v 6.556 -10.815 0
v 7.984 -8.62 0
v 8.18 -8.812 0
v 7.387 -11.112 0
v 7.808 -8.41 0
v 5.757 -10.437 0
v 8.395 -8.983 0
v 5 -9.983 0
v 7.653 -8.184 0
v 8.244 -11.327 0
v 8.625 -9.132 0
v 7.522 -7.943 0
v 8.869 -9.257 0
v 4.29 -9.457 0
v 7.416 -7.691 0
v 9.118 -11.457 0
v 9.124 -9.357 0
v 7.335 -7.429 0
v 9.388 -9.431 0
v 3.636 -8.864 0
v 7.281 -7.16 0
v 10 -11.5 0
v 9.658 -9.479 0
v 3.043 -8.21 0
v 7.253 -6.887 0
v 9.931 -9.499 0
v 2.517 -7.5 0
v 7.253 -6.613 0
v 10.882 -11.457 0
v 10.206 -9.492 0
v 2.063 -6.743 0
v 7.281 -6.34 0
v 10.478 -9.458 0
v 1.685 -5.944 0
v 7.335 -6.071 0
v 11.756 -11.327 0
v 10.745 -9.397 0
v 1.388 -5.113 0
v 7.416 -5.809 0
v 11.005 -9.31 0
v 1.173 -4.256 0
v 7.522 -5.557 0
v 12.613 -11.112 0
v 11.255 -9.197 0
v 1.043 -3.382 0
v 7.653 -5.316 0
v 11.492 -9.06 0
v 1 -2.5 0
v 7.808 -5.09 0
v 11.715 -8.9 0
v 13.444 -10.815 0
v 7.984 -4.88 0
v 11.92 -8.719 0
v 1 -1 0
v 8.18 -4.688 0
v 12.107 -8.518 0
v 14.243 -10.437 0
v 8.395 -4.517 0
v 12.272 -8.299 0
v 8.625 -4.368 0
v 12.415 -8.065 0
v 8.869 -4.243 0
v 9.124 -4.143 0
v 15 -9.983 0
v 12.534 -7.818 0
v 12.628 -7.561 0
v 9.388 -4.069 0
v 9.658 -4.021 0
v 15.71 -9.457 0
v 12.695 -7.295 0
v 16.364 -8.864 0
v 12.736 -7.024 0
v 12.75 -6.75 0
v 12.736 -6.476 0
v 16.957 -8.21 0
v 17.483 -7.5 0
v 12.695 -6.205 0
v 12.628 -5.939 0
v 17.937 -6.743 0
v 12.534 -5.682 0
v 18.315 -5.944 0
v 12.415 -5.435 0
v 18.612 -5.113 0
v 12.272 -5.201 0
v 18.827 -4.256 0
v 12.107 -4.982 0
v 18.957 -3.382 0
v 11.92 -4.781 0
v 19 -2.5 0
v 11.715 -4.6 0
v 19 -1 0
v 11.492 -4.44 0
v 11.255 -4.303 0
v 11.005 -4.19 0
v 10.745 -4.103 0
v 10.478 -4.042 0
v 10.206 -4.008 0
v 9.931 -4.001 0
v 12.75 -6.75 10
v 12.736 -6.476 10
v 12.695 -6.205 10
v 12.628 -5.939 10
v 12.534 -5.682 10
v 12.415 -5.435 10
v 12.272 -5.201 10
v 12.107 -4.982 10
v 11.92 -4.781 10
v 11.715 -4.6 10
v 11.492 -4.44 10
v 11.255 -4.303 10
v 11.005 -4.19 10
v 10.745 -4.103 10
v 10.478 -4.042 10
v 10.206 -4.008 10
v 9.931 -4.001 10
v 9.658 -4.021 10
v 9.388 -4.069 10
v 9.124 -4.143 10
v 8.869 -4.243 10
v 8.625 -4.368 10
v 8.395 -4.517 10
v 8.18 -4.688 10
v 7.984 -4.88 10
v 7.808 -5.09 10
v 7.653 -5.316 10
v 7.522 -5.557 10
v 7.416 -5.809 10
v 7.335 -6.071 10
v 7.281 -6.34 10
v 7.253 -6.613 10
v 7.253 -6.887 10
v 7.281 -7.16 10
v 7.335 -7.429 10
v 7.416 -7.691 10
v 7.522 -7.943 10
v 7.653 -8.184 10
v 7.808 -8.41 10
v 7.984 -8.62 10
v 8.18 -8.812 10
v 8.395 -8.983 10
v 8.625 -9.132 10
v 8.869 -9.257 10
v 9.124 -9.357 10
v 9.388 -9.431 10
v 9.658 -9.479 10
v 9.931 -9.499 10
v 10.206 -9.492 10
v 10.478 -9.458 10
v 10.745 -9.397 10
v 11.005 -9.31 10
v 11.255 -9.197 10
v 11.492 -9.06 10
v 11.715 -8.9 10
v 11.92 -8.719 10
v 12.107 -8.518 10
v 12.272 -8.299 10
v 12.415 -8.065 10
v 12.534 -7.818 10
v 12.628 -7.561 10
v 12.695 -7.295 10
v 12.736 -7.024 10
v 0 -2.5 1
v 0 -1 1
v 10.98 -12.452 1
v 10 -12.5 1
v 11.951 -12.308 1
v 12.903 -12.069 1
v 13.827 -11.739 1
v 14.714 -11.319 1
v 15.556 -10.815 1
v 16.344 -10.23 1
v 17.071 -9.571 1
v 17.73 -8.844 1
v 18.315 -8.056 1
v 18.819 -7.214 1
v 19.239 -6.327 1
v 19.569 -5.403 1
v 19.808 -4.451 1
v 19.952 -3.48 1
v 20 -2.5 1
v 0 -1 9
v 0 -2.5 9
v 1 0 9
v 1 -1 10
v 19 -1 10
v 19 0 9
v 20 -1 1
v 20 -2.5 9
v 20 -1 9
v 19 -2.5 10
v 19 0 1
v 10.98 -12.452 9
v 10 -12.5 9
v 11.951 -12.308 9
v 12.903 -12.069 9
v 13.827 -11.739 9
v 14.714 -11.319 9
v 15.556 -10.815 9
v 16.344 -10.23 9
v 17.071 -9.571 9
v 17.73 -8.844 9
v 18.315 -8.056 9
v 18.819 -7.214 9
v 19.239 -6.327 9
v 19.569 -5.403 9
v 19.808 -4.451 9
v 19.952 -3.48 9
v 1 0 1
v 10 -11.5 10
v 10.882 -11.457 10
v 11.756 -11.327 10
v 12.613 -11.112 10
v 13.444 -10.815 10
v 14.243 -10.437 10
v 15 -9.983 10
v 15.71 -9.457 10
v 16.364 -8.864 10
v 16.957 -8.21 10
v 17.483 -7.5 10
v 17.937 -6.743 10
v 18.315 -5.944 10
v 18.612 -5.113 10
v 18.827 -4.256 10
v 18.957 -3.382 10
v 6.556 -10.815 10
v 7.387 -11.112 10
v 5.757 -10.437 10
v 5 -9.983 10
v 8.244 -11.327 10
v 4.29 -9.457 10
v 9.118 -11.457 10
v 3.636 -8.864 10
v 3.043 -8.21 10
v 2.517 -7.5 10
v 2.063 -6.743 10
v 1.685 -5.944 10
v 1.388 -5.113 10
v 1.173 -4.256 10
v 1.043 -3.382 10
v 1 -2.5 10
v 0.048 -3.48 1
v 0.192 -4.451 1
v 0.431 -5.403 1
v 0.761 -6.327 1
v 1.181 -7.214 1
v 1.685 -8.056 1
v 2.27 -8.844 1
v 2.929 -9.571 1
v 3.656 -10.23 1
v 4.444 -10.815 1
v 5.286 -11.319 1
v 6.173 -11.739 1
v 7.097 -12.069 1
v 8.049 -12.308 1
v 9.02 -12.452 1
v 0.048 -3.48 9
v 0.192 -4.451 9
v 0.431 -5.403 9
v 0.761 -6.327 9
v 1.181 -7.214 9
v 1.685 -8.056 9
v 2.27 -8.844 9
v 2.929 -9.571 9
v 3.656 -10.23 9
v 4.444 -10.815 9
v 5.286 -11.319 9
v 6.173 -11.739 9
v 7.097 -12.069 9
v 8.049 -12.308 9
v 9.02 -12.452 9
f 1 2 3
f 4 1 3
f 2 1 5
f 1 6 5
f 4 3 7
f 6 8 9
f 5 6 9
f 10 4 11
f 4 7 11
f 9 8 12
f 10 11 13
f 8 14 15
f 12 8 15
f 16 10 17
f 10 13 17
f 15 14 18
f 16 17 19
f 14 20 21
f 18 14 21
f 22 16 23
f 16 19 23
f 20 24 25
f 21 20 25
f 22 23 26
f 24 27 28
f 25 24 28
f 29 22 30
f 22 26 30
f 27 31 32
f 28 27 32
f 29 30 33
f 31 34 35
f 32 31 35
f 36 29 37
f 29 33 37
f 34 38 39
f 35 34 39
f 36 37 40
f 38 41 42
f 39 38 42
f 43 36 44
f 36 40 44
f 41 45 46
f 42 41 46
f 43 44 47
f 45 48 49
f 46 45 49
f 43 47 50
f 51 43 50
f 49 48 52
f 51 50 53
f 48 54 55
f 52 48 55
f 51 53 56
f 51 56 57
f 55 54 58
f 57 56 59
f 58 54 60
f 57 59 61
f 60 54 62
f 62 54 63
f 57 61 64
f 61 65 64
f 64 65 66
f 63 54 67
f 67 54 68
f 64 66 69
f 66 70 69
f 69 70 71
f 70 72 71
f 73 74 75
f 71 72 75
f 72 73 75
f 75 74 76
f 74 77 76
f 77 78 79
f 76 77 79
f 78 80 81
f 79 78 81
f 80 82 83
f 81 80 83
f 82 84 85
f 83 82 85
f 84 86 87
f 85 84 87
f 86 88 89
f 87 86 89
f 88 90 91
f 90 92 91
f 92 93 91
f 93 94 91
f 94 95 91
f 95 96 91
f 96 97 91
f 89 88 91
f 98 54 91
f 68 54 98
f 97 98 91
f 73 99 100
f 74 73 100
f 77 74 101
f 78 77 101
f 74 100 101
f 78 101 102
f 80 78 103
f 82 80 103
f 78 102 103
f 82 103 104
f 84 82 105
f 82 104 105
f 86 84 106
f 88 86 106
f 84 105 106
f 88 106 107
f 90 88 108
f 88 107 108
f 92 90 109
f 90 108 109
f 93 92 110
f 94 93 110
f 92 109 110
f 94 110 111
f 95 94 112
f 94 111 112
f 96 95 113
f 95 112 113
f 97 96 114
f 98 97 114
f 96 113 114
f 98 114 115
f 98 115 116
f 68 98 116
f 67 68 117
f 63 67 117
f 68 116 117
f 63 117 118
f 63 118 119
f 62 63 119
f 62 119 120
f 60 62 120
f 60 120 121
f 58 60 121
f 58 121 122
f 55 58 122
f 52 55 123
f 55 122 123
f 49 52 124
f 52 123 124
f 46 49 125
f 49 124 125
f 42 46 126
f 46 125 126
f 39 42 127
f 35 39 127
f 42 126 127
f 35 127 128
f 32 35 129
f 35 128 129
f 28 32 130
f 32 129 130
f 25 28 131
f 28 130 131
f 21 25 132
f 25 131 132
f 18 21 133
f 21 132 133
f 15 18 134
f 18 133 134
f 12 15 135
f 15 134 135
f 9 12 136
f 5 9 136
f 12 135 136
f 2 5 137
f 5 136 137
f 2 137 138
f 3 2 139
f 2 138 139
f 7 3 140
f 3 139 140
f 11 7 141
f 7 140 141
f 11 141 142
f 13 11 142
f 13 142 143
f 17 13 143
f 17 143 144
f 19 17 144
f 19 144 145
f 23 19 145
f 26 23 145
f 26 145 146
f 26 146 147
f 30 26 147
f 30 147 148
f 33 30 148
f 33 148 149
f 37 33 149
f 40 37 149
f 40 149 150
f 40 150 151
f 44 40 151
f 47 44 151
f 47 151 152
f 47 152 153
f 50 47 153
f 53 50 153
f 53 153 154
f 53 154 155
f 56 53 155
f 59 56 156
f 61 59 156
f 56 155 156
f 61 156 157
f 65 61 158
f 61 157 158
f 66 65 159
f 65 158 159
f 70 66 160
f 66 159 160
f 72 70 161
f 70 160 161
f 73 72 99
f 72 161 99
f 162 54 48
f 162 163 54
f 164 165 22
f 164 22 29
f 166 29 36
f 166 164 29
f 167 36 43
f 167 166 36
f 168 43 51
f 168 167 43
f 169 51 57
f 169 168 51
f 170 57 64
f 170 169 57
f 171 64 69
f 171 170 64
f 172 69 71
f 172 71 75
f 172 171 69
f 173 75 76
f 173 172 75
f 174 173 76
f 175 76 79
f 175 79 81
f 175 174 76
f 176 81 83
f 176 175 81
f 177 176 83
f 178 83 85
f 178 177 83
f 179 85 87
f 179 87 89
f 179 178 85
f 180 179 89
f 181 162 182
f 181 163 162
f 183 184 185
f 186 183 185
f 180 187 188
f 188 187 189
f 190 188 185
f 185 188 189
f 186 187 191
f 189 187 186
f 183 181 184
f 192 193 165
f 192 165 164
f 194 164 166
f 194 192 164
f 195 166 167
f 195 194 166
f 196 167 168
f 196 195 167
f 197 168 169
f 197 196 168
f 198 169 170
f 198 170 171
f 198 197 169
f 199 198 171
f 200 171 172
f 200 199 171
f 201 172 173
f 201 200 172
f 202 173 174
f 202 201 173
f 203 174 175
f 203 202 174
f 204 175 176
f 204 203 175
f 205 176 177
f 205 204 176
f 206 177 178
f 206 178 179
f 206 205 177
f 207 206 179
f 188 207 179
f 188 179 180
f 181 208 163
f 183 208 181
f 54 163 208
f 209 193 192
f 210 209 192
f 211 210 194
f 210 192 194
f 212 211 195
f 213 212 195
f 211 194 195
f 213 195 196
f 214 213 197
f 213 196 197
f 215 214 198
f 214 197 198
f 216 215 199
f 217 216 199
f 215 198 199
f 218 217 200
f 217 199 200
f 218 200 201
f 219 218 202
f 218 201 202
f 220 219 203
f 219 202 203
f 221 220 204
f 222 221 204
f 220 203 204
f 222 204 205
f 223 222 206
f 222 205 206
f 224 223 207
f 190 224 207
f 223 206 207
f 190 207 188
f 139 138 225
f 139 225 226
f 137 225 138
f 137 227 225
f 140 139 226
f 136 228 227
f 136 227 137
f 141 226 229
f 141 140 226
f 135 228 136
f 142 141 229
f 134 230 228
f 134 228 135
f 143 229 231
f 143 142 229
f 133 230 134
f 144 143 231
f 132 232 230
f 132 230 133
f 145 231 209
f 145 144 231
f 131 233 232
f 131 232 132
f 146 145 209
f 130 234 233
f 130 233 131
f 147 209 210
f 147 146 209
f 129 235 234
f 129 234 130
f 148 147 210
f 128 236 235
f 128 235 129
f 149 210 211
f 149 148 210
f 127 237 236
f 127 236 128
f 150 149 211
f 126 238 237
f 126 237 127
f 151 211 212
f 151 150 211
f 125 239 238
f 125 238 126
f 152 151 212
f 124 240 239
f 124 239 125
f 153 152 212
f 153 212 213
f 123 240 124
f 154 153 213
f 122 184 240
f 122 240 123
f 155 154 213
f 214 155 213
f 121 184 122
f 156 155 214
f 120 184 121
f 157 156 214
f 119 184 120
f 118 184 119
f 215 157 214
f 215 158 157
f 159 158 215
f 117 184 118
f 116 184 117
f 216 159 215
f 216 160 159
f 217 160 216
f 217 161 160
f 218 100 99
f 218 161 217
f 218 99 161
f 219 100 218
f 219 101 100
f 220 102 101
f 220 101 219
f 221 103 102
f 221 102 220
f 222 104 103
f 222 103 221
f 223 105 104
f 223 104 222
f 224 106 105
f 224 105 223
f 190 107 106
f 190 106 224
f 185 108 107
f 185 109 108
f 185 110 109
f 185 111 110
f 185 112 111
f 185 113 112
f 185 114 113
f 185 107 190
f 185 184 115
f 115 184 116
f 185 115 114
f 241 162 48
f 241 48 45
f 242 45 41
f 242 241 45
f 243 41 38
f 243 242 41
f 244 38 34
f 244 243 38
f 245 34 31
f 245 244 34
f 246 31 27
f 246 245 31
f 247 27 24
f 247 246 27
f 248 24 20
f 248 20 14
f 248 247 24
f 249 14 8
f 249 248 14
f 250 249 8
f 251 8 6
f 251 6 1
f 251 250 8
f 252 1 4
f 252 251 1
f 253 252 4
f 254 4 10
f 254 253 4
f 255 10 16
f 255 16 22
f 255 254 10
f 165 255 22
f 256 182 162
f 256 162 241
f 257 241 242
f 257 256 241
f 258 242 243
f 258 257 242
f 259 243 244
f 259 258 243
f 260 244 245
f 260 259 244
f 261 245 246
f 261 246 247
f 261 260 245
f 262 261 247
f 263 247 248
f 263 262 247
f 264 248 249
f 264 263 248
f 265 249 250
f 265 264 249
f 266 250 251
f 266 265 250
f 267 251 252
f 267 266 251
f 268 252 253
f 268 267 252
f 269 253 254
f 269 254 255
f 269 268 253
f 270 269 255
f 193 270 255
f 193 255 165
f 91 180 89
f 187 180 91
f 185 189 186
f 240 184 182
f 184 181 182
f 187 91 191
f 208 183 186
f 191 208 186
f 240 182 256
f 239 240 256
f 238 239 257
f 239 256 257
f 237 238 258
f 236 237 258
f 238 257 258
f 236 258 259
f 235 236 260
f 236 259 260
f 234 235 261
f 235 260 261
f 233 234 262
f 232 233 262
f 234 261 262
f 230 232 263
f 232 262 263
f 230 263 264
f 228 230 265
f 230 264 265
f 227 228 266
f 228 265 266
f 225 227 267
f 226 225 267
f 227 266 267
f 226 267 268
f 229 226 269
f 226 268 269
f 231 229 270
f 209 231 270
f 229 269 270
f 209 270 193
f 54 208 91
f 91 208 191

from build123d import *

# Parameters (mm, degrees)
F0_W     = 20
F0_H     = 10
F1_DEPTH = 12.5
F2_R     = 2.75
F3_DEPTH = 10
F4_R     = 9.99999
F5_SIZE  = 1


# Not quite as in the source:
# - a fillet or chamfer is up to 0.001 mm smaller than in the source, because OpenCascade refuses the exact size


with BuildPart() as f1:
    # F0 (on Front) → F1 (new body)
    with BuildSketch(Plane.XZ):
        with Locations((10, 5)):
            Rectangle(F0_W, F0_H)
    extrude(amount=F1_DEPTH)

    # F2 (on face) → F3 (cut, through all)
    with BuildSketch(Plane.XY.offset(10)):
        with Locations((10, -6.75)):
            Circle(F2_R)
    extrude(amount=-F3_DEPTH, mode=Mode.SUBTRACT)

    # F4 (radius 10 in the source; OpenCascade refuses exactly that, so slightly less here)
    f4_edges = [f1.edges().sort_by_distance(p)[0] for p in [
        (0, -12.5, 5),
        (20, -12.5, 5),
    ]]
    fillet(f4_edges, radius=F4_R)

    # F5
    f5_edges = [f1.edges().sort_by_distance(p)[0] for p in [
        (17.071071, -9.571071, 0),
        (10.00001, -12.5, 5),
        (20, -2.50001, 5),
        (17.071071, -9.571071, 10),
        (0, 0, 5),
        (10, 0, 0),
        (20, 0, 5),
        (10, 0, 10),
    ]]
    chamfer(f5_edges, length=F5_SIZE)


solid = f1.part
